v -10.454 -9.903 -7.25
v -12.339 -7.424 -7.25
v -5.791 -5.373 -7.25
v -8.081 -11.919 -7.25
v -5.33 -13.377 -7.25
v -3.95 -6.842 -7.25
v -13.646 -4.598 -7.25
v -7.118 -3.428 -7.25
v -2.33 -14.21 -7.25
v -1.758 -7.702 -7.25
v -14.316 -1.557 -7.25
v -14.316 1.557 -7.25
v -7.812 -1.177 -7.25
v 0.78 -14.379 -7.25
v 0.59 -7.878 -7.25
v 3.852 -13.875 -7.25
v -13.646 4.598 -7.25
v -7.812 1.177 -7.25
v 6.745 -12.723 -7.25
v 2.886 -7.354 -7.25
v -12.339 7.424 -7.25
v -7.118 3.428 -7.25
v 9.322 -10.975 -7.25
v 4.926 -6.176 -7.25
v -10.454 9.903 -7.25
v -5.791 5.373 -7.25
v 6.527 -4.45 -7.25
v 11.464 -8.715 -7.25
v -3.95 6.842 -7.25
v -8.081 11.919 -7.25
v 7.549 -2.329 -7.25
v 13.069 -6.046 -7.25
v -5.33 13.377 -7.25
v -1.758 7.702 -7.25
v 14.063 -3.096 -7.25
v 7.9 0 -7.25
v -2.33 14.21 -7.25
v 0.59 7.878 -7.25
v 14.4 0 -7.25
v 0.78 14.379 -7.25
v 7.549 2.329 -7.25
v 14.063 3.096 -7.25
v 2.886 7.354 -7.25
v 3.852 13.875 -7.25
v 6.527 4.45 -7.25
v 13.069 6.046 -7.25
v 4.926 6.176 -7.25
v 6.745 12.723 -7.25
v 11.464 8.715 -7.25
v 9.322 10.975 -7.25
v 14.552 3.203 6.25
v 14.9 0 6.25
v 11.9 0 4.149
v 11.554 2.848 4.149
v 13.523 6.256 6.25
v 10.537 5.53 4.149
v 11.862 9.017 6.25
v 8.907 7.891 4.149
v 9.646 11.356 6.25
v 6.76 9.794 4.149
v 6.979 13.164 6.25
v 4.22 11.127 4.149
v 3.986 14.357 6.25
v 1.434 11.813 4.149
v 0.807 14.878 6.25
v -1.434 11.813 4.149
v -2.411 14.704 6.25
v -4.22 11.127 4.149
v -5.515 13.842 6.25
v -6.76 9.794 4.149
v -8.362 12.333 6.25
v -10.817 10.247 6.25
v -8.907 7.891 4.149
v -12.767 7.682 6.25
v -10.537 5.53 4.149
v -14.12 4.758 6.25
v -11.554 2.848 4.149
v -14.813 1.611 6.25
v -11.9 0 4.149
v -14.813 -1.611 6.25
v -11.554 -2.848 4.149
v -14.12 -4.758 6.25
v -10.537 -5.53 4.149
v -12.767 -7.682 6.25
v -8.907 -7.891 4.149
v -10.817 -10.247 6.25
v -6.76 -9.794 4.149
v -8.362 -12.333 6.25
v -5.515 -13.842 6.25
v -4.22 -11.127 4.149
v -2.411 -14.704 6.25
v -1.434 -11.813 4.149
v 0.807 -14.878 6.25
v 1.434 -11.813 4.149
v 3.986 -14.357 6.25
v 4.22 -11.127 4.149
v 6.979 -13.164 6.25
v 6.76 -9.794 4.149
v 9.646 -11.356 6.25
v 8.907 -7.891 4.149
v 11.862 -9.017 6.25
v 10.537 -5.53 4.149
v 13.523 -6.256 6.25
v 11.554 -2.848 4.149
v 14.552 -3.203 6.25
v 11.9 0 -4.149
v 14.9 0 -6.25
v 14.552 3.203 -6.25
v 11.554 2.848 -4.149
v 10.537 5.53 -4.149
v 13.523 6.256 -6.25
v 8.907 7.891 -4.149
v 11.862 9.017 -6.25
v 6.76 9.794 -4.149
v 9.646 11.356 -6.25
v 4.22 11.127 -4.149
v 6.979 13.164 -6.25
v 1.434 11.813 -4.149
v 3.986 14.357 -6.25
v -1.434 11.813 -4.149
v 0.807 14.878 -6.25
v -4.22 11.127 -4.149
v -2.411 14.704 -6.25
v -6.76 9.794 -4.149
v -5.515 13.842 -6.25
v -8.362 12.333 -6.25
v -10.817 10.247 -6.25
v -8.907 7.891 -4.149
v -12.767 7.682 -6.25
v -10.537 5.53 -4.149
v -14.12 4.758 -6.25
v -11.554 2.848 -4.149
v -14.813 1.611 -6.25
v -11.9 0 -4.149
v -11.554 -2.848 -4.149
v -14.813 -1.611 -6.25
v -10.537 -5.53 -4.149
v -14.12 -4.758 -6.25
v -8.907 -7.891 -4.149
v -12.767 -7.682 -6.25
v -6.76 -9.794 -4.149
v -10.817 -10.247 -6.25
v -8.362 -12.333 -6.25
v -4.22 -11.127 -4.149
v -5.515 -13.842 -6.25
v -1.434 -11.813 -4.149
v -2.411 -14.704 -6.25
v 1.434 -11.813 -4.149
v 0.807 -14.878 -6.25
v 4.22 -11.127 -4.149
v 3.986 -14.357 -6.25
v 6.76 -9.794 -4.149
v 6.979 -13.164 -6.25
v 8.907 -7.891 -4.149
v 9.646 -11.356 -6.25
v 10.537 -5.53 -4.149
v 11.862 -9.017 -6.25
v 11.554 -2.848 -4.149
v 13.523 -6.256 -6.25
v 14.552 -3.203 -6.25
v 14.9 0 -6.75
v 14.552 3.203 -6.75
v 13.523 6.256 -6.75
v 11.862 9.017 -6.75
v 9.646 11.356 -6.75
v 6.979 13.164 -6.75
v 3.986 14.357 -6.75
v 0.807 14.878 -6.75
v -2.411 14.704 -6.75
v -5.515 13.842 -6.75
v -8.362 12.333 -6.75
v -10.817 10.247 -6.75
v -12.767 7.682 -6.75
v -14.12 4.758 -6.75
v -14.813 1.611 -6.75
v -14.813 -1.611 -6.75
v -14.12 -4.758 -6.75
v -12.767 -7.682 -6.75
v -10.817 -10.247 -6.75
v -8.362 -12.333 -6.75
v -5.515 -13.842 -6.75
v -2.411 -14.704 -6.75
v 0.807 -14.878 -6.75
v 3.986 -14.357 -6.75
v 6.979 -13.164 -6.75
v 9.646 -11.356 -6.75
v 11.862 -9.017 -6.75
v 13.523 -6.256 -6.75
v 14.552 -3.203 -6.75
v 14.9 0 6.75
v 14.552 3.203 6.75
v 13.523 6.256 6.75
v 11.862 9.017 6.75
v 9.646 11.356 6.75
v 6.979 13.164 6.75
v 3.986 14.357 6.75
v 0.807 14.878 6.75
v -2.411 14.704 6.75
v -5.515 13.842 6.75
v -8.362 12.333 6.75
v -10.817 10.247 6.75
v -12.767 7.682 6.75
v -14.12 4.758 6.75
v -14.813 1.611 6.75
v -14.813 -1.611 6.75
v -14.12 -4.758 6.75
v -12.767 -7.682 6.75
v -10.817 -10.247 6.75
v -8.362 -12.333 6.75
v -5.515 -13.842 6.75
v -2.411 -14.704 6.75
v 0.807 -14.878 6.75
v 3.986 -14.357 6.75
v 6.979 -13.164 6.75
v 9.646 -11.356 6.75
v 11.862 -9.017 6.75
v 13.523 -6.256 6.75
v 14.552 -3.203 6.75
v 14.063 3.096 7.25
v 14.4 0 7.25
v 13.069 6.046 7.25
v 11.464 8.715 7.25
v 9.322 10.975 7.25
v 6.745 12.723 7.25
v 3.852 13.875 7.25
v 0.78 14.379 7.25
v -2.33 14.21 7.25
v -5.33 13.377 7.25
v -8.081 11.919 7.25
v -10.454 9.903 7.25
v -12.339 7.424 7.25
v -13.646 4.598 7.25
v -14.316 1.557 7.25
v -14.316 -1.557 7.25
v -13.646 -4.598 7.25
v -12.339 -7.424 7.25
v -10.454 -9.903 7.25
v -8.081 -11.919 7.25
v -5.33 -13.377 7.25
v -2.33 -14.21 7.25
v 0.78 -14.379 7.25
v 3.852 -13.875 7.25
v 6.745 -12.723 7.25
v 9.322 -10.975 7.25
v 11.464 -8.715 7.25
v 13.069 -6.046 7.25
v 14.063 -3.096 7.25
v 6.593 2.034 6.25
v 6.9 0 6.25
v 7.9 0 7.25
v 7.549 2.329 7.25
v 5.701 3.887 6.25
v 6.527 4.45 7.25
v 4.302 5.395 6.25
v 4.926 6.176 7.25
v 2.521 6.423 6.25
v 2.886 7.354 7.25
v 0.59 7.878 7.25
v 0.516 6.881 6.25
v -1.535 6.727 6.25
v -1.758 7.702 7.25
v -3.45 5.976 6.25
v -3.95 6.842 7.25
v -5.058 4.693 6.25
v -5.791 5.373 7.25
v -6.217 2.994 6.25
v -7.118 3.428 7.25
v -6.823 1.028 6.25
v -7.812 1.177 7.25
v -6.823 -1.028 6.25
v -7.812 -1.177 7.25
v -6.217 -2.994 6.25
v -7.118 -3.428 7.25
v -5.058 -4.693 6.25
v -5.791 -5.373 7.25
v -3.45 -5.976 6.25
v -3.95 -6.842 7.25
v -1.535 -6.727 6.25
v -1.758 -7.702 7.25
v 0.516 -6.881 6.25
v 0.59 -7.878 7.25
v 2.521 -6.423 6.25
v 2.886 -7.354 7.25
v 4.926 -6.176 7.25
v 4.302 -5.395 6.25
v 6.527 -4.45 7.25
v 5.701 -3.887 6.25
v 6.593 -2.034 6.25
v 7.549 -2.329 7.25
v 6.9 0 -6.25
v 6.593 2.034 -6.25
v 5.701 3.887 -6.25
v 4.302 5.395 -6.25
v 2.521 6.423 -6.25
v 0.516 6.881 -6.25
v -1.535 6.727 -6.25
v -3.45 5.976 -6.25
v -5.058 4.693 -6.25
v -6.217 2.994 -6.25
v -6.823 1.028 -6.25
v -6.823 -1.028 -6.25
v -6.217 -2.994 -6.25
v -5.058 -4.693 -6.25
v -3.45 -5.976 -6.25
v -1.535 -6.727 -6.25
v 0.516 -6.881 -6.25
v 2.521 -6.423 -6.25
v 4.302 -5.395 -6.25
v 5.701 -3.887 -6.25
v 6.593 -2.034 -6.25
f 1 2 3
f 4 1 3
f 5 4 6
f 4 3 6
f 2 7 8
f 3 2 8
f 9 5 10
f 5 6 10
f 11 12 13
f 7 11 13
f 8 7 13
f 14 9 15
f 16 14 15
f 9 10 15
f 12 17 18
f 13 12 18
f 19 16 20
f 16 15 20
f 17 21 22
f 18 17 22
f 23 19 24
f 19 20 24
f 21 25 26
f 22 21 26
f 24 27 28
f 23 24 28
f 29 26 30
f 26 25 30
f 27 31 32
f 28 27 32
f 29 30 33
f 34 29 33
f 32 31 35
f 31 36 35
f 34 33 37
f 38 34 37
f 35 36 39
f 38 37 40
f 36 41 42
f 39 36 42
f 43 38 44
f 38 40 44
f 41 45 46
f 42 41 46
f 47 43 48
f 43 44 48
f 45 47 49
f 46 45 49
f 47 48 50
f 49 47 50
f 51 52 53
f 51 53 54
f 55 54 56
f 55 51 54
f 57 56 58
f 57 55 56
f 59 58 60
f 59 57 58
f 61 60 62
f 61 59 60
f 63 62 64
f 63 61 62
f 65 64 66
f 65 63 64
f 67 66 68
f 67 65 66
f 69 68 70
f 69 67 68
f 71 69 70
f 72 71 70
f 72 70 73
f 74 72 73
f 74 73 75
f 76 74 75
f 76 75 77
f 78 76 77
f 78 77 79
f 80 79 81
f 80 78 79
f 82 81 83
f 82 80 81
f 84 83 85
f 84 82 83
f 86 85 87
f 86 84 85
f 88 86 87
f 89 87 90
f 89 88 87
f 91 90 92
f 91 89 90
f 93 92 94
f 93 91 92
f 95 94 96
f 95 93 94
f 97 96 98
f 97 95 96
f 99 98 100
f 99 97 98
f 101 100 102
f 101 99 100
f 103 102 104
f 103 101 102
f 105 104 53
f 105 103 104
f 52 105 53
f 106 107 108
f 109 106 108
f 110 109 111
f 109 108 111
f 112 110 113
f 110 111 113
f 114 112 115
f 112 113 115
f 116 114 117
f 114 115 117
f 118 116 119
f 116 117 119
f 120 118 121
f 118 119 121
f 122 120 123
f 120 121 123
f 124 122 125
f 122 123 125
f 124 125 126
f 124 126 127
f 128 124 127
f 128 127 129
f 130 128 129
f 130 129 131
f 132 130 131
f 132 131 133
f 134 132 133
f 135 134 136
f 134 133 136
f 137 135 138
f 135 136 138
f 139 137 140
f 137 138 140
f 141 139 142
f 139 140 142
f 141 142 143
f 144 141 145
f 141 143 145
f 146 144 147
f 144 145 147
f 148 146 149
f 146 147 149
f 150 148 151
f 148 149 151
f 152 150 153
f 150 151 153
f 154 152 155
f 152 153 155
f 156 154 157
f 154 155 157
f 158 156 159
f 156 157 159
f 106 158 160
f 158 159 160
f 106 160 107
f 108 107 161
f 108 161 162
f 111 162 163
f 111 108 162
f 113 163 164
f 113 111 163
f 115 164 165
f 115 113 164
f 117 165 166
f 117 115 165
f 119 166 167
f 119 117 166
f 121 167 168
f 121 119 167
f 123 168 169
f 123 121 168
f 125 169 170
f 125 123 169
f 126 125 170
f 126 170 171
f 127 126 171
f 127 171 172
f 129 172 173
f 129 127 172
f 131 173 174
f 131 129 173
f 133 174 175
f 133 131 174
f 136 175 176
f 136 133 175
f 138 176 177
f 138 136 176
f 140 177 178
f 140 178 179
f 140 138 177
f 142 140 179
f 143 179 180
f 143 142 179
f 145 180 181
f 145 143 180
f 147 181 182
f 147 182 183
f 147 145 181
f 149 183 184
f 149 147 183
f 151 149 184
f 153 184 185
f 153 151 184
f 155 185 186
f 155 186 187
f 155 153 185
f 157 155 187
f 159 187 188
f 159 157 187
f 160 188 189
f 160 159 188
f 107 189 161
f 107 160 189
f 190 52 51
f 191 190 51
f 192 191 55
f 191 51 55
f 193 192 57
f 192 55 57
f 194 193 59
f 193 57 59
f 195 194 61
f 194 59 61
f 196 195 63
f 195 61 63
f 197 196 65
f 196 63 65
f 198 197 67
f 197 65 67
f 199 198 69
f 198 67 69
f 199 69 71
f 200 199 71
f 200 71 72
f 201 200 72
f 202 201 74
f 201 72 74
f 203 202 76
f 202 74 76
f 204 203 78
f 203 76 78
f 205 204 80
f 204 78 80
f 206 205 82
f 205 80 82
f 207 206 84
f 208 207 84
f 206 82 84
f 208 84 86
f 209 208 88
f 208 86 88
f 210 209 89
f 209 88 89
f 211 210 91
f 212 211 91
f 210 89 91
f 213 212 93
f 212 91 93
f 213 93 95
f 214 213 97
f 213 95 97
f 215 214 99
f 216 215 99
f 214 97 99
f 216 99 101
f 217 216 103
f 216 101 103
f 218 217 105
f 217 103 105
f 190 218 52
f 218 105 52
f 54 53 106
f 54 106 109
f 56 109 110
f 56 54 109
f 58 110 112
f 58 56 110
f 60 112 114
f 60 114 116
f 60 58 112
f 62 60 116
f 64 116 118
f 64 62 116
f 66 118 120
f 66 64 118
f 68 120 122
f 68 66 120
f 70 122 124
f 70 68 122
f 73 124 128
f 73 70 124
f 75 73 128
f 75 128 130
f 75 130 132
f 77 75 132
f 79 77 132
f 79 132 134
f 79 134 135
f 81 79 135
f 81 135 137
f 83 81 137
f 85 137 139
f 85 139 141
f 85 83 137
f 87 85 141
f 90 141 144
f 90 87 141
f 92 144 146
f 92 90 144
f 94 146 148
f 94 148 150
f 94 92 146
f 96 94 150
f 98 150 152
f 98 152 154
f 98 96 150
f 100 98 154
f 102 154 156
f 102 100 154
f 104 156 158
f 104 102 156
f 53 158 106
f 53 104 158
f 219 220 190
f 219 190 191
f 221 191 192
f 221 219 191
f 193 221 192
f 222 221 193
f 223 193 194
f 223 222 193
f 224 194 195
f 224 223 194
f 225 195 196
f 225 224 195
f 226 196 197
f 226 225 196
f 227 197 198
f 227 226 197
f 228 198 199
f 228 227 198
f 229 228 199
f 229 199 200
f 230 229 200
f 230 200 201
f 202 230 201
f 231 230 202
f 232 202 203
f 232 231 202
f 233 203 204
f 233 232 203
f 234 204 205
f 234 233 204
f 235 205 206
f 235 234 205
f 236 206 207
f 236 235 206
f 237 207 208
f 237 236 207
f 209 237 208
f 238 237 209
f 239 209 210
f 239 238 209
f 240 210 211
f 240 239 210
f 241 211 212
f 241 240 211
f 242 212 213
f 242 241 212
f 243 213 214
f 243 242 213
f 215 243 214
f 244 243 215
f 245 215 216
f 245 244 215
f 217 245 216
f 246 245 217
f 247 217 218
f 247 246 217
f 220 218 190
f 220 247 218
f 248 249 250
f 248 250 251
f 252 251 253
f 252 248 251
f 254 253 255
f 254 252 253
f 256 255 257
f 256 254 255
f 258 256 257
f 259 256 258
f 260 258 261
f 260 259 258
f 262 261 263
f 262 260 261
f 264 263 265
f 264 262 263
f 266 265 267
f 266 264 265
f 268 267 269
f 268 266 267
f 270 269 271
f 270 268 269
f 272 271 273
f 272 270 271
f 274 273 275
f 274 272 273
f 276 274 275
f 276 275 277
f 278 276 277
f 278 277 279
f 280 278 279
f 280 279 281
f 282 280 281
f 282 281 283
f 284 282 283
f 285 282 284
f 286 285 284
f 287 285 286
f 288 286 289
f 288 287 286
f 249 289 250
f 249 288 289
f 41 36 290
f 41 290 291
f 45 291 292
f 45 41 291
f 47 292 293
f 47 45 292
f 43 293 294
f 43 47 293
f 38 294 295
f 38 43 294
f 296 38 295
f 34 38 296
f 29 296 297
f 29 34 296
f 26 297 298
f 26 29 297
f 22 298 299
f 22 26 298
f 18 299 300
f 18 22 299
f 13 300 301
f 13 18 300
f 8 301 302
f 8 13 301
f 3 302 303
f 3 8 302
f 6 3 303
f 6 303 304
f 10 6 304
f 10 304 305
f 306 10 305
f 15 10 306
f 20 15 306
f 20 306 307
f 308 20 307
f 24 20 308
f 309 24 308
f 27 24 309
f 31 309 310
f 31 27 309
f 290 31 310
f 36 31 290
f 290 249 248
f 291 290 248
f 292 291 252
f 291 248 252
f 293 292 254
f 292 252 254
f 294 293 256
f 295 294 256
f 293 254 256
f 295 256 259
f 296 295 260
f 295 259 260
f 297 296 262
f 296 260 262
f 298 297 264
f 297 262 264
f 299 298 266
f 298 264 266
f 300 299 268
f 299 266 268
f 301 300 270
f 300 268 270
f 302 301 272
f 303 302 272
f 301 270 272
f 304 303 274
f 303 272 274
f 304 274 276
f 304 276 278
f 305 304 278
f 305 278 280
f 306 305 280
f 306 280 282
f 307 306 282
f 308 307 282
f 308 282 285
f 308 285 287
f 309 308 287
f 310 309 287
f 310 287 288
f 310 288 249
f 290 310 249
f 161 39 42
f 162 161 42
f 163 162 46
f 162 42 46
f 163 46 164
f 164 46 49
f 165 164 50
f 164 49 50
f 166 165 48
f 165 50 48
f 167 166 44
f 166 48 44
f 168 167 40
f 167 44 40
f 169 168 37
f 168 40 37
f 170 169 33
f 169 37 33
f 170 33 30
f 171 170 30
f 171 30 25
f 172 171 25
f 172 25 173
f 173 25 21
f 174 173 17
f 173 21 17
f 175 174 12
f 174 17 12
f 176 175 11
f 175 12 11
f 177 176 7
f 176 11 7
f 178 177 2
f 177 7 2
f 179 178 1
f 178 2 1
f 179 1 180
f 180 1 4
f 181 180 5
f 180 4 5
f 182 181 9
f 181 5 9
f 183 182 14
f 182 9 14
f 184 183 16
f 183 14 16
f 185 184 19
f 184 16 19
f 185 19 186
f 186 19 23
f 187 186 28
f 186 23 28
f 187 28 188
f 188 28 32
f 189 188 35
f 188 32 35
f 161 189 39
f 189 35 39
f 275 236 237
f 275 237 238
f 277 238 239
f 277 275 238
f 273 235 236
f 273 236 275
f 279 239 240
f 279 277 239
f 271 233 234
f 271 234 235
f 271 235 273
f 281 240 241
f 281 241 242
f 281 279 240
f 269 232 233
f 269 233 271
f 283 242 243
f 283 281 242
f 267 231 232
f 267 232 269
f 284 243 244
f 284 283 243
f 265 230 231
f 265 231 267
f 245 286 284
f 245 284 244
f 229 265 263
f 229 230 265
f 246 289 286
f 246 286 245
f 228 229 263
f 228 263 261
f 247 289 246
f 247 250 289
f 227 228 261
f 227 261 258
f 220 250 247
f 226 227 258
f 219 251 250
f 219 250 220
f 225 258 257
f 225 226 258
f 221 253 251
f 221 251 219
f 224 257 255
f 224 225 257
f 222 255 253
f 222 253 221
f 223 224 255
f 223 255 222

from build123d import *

# Parameters (mm, degrees)
SKETCH1_R           = 11.9
SKETCH1_R_2         = 6.9
BOSS_EXTRUDE1_DEPTH = 6.25
SKETCH2_R           = 14.9
SKETCH2_R_2         = 6.9
BOSS_EXTRUDE2_DEPTH = 1
CHAMFER1_SIZE       = 2.100622615
CHAMFER1_SIZE_2     = 3
CHAMFER2_SIZE       = 0.5
CHAMFER3_SIZE       = 1


with BuildPart() as part:
    # Sketch1 → Boss-Extrude1 (new, symmetric)
    with BuildSketch(Plane.XY):
        Circle(SKETCH1_R)
        Circle(SKETCH1_R_2, mode=Mode.SUBTRACT)
    extrude(amount=BOSS_EXTRUDE1_DEPTH, both=True)

    # Sketch2 → Boss-Extrude2 (add)
    with BuildSketch(Plane.XY.offset(6.25)):
        Circle(SKETCH2_R)
        Circle(SKETCH2_R_2, mode=Mode.SUBTRACT)
    boss_extrude2 = extrude(amount=BOSS_EXTRUDE2_DEPTH)

    # Mirror1: Boss-Extrude2 across plane
    add(boss_extrude2.mirror(Plane.XY))

    # Chamfer1
    # the kernel refuses this chamfer: 3, 2.100622615 mm, written as the material it adds along each edge
    with BuildSketch(Plane(origin=(0, 0, -6.25), x_dir=(1, 0, 0), z_dir=(0, -1, 0))) as chamfer1_piece_1_section:
        Polygon((11.9, CHAMFER1_SIZE), (11.9 + CHAMFER1_SIZE_2, 0), (11.9, 0), align=None)
    chamfer1_piece_1 = revolve(axis=Axis((0, 0, -6.25), (0, 0, 1)), mode=Mode.PRIVATE)
    chamfer1_piece_1 = chamfer1_piece_1 & Plane(origin=(0, 0, -5.219213632), x_dir=(1, 0, 0), z_dir=(0, 0, 1)) * Cylinder(14.9, 60, mode=Mode.PRIVATE)
    add(chamfer1_piece_1)
    with BuildSketch(Plane(origin=(0, 0, 6.25), x_dir=(1, 0, 0), z_dir=(0, -1, 0))) as chamfer1_piece_2_section:
        Polygon((11.9, -CHAMFER1_SIZE), (11.9 + CHAMFER1_SIZE_2, 0), (11.9, 0), align=None)
    chamfer1_piece_2 = revolve(axis=Axis((0, 0, 6.25), (0, 0, 1)), mode=Mode.PRIVATE)
    chamfer1_piece_2 = chamfer1_piece_2 & Plane(origin=(0, 0, 5.219213632), x_dir=(1, 0, 0), z_dir=(0, 0, -1)) * Cylinder(14.9, 60, mode=Mode.PRIVATE)
    add(chamfer1_piece_2)

    # Chamfer2
    chamfer2_edges = [part.edges().sort_by_distance(p)[0] for p in [
        (-14.9, 0, 7.25),
        (-14.9, 0, -7.25),
    ]]
    chamfer(chamfer2_edges, length=CHAMFER2_SIZE)

    # Chamfer3
    chamfer3_edges = [part.edges().sort_by_distance(p)[0] for p in [
        (-6.9, 0, 7.25),
        (-6.9, 0, -7.25),
    ]]
    chamfer(chamfer3_edges, length=CHAMFER3_SIZE)


solid = part.part
